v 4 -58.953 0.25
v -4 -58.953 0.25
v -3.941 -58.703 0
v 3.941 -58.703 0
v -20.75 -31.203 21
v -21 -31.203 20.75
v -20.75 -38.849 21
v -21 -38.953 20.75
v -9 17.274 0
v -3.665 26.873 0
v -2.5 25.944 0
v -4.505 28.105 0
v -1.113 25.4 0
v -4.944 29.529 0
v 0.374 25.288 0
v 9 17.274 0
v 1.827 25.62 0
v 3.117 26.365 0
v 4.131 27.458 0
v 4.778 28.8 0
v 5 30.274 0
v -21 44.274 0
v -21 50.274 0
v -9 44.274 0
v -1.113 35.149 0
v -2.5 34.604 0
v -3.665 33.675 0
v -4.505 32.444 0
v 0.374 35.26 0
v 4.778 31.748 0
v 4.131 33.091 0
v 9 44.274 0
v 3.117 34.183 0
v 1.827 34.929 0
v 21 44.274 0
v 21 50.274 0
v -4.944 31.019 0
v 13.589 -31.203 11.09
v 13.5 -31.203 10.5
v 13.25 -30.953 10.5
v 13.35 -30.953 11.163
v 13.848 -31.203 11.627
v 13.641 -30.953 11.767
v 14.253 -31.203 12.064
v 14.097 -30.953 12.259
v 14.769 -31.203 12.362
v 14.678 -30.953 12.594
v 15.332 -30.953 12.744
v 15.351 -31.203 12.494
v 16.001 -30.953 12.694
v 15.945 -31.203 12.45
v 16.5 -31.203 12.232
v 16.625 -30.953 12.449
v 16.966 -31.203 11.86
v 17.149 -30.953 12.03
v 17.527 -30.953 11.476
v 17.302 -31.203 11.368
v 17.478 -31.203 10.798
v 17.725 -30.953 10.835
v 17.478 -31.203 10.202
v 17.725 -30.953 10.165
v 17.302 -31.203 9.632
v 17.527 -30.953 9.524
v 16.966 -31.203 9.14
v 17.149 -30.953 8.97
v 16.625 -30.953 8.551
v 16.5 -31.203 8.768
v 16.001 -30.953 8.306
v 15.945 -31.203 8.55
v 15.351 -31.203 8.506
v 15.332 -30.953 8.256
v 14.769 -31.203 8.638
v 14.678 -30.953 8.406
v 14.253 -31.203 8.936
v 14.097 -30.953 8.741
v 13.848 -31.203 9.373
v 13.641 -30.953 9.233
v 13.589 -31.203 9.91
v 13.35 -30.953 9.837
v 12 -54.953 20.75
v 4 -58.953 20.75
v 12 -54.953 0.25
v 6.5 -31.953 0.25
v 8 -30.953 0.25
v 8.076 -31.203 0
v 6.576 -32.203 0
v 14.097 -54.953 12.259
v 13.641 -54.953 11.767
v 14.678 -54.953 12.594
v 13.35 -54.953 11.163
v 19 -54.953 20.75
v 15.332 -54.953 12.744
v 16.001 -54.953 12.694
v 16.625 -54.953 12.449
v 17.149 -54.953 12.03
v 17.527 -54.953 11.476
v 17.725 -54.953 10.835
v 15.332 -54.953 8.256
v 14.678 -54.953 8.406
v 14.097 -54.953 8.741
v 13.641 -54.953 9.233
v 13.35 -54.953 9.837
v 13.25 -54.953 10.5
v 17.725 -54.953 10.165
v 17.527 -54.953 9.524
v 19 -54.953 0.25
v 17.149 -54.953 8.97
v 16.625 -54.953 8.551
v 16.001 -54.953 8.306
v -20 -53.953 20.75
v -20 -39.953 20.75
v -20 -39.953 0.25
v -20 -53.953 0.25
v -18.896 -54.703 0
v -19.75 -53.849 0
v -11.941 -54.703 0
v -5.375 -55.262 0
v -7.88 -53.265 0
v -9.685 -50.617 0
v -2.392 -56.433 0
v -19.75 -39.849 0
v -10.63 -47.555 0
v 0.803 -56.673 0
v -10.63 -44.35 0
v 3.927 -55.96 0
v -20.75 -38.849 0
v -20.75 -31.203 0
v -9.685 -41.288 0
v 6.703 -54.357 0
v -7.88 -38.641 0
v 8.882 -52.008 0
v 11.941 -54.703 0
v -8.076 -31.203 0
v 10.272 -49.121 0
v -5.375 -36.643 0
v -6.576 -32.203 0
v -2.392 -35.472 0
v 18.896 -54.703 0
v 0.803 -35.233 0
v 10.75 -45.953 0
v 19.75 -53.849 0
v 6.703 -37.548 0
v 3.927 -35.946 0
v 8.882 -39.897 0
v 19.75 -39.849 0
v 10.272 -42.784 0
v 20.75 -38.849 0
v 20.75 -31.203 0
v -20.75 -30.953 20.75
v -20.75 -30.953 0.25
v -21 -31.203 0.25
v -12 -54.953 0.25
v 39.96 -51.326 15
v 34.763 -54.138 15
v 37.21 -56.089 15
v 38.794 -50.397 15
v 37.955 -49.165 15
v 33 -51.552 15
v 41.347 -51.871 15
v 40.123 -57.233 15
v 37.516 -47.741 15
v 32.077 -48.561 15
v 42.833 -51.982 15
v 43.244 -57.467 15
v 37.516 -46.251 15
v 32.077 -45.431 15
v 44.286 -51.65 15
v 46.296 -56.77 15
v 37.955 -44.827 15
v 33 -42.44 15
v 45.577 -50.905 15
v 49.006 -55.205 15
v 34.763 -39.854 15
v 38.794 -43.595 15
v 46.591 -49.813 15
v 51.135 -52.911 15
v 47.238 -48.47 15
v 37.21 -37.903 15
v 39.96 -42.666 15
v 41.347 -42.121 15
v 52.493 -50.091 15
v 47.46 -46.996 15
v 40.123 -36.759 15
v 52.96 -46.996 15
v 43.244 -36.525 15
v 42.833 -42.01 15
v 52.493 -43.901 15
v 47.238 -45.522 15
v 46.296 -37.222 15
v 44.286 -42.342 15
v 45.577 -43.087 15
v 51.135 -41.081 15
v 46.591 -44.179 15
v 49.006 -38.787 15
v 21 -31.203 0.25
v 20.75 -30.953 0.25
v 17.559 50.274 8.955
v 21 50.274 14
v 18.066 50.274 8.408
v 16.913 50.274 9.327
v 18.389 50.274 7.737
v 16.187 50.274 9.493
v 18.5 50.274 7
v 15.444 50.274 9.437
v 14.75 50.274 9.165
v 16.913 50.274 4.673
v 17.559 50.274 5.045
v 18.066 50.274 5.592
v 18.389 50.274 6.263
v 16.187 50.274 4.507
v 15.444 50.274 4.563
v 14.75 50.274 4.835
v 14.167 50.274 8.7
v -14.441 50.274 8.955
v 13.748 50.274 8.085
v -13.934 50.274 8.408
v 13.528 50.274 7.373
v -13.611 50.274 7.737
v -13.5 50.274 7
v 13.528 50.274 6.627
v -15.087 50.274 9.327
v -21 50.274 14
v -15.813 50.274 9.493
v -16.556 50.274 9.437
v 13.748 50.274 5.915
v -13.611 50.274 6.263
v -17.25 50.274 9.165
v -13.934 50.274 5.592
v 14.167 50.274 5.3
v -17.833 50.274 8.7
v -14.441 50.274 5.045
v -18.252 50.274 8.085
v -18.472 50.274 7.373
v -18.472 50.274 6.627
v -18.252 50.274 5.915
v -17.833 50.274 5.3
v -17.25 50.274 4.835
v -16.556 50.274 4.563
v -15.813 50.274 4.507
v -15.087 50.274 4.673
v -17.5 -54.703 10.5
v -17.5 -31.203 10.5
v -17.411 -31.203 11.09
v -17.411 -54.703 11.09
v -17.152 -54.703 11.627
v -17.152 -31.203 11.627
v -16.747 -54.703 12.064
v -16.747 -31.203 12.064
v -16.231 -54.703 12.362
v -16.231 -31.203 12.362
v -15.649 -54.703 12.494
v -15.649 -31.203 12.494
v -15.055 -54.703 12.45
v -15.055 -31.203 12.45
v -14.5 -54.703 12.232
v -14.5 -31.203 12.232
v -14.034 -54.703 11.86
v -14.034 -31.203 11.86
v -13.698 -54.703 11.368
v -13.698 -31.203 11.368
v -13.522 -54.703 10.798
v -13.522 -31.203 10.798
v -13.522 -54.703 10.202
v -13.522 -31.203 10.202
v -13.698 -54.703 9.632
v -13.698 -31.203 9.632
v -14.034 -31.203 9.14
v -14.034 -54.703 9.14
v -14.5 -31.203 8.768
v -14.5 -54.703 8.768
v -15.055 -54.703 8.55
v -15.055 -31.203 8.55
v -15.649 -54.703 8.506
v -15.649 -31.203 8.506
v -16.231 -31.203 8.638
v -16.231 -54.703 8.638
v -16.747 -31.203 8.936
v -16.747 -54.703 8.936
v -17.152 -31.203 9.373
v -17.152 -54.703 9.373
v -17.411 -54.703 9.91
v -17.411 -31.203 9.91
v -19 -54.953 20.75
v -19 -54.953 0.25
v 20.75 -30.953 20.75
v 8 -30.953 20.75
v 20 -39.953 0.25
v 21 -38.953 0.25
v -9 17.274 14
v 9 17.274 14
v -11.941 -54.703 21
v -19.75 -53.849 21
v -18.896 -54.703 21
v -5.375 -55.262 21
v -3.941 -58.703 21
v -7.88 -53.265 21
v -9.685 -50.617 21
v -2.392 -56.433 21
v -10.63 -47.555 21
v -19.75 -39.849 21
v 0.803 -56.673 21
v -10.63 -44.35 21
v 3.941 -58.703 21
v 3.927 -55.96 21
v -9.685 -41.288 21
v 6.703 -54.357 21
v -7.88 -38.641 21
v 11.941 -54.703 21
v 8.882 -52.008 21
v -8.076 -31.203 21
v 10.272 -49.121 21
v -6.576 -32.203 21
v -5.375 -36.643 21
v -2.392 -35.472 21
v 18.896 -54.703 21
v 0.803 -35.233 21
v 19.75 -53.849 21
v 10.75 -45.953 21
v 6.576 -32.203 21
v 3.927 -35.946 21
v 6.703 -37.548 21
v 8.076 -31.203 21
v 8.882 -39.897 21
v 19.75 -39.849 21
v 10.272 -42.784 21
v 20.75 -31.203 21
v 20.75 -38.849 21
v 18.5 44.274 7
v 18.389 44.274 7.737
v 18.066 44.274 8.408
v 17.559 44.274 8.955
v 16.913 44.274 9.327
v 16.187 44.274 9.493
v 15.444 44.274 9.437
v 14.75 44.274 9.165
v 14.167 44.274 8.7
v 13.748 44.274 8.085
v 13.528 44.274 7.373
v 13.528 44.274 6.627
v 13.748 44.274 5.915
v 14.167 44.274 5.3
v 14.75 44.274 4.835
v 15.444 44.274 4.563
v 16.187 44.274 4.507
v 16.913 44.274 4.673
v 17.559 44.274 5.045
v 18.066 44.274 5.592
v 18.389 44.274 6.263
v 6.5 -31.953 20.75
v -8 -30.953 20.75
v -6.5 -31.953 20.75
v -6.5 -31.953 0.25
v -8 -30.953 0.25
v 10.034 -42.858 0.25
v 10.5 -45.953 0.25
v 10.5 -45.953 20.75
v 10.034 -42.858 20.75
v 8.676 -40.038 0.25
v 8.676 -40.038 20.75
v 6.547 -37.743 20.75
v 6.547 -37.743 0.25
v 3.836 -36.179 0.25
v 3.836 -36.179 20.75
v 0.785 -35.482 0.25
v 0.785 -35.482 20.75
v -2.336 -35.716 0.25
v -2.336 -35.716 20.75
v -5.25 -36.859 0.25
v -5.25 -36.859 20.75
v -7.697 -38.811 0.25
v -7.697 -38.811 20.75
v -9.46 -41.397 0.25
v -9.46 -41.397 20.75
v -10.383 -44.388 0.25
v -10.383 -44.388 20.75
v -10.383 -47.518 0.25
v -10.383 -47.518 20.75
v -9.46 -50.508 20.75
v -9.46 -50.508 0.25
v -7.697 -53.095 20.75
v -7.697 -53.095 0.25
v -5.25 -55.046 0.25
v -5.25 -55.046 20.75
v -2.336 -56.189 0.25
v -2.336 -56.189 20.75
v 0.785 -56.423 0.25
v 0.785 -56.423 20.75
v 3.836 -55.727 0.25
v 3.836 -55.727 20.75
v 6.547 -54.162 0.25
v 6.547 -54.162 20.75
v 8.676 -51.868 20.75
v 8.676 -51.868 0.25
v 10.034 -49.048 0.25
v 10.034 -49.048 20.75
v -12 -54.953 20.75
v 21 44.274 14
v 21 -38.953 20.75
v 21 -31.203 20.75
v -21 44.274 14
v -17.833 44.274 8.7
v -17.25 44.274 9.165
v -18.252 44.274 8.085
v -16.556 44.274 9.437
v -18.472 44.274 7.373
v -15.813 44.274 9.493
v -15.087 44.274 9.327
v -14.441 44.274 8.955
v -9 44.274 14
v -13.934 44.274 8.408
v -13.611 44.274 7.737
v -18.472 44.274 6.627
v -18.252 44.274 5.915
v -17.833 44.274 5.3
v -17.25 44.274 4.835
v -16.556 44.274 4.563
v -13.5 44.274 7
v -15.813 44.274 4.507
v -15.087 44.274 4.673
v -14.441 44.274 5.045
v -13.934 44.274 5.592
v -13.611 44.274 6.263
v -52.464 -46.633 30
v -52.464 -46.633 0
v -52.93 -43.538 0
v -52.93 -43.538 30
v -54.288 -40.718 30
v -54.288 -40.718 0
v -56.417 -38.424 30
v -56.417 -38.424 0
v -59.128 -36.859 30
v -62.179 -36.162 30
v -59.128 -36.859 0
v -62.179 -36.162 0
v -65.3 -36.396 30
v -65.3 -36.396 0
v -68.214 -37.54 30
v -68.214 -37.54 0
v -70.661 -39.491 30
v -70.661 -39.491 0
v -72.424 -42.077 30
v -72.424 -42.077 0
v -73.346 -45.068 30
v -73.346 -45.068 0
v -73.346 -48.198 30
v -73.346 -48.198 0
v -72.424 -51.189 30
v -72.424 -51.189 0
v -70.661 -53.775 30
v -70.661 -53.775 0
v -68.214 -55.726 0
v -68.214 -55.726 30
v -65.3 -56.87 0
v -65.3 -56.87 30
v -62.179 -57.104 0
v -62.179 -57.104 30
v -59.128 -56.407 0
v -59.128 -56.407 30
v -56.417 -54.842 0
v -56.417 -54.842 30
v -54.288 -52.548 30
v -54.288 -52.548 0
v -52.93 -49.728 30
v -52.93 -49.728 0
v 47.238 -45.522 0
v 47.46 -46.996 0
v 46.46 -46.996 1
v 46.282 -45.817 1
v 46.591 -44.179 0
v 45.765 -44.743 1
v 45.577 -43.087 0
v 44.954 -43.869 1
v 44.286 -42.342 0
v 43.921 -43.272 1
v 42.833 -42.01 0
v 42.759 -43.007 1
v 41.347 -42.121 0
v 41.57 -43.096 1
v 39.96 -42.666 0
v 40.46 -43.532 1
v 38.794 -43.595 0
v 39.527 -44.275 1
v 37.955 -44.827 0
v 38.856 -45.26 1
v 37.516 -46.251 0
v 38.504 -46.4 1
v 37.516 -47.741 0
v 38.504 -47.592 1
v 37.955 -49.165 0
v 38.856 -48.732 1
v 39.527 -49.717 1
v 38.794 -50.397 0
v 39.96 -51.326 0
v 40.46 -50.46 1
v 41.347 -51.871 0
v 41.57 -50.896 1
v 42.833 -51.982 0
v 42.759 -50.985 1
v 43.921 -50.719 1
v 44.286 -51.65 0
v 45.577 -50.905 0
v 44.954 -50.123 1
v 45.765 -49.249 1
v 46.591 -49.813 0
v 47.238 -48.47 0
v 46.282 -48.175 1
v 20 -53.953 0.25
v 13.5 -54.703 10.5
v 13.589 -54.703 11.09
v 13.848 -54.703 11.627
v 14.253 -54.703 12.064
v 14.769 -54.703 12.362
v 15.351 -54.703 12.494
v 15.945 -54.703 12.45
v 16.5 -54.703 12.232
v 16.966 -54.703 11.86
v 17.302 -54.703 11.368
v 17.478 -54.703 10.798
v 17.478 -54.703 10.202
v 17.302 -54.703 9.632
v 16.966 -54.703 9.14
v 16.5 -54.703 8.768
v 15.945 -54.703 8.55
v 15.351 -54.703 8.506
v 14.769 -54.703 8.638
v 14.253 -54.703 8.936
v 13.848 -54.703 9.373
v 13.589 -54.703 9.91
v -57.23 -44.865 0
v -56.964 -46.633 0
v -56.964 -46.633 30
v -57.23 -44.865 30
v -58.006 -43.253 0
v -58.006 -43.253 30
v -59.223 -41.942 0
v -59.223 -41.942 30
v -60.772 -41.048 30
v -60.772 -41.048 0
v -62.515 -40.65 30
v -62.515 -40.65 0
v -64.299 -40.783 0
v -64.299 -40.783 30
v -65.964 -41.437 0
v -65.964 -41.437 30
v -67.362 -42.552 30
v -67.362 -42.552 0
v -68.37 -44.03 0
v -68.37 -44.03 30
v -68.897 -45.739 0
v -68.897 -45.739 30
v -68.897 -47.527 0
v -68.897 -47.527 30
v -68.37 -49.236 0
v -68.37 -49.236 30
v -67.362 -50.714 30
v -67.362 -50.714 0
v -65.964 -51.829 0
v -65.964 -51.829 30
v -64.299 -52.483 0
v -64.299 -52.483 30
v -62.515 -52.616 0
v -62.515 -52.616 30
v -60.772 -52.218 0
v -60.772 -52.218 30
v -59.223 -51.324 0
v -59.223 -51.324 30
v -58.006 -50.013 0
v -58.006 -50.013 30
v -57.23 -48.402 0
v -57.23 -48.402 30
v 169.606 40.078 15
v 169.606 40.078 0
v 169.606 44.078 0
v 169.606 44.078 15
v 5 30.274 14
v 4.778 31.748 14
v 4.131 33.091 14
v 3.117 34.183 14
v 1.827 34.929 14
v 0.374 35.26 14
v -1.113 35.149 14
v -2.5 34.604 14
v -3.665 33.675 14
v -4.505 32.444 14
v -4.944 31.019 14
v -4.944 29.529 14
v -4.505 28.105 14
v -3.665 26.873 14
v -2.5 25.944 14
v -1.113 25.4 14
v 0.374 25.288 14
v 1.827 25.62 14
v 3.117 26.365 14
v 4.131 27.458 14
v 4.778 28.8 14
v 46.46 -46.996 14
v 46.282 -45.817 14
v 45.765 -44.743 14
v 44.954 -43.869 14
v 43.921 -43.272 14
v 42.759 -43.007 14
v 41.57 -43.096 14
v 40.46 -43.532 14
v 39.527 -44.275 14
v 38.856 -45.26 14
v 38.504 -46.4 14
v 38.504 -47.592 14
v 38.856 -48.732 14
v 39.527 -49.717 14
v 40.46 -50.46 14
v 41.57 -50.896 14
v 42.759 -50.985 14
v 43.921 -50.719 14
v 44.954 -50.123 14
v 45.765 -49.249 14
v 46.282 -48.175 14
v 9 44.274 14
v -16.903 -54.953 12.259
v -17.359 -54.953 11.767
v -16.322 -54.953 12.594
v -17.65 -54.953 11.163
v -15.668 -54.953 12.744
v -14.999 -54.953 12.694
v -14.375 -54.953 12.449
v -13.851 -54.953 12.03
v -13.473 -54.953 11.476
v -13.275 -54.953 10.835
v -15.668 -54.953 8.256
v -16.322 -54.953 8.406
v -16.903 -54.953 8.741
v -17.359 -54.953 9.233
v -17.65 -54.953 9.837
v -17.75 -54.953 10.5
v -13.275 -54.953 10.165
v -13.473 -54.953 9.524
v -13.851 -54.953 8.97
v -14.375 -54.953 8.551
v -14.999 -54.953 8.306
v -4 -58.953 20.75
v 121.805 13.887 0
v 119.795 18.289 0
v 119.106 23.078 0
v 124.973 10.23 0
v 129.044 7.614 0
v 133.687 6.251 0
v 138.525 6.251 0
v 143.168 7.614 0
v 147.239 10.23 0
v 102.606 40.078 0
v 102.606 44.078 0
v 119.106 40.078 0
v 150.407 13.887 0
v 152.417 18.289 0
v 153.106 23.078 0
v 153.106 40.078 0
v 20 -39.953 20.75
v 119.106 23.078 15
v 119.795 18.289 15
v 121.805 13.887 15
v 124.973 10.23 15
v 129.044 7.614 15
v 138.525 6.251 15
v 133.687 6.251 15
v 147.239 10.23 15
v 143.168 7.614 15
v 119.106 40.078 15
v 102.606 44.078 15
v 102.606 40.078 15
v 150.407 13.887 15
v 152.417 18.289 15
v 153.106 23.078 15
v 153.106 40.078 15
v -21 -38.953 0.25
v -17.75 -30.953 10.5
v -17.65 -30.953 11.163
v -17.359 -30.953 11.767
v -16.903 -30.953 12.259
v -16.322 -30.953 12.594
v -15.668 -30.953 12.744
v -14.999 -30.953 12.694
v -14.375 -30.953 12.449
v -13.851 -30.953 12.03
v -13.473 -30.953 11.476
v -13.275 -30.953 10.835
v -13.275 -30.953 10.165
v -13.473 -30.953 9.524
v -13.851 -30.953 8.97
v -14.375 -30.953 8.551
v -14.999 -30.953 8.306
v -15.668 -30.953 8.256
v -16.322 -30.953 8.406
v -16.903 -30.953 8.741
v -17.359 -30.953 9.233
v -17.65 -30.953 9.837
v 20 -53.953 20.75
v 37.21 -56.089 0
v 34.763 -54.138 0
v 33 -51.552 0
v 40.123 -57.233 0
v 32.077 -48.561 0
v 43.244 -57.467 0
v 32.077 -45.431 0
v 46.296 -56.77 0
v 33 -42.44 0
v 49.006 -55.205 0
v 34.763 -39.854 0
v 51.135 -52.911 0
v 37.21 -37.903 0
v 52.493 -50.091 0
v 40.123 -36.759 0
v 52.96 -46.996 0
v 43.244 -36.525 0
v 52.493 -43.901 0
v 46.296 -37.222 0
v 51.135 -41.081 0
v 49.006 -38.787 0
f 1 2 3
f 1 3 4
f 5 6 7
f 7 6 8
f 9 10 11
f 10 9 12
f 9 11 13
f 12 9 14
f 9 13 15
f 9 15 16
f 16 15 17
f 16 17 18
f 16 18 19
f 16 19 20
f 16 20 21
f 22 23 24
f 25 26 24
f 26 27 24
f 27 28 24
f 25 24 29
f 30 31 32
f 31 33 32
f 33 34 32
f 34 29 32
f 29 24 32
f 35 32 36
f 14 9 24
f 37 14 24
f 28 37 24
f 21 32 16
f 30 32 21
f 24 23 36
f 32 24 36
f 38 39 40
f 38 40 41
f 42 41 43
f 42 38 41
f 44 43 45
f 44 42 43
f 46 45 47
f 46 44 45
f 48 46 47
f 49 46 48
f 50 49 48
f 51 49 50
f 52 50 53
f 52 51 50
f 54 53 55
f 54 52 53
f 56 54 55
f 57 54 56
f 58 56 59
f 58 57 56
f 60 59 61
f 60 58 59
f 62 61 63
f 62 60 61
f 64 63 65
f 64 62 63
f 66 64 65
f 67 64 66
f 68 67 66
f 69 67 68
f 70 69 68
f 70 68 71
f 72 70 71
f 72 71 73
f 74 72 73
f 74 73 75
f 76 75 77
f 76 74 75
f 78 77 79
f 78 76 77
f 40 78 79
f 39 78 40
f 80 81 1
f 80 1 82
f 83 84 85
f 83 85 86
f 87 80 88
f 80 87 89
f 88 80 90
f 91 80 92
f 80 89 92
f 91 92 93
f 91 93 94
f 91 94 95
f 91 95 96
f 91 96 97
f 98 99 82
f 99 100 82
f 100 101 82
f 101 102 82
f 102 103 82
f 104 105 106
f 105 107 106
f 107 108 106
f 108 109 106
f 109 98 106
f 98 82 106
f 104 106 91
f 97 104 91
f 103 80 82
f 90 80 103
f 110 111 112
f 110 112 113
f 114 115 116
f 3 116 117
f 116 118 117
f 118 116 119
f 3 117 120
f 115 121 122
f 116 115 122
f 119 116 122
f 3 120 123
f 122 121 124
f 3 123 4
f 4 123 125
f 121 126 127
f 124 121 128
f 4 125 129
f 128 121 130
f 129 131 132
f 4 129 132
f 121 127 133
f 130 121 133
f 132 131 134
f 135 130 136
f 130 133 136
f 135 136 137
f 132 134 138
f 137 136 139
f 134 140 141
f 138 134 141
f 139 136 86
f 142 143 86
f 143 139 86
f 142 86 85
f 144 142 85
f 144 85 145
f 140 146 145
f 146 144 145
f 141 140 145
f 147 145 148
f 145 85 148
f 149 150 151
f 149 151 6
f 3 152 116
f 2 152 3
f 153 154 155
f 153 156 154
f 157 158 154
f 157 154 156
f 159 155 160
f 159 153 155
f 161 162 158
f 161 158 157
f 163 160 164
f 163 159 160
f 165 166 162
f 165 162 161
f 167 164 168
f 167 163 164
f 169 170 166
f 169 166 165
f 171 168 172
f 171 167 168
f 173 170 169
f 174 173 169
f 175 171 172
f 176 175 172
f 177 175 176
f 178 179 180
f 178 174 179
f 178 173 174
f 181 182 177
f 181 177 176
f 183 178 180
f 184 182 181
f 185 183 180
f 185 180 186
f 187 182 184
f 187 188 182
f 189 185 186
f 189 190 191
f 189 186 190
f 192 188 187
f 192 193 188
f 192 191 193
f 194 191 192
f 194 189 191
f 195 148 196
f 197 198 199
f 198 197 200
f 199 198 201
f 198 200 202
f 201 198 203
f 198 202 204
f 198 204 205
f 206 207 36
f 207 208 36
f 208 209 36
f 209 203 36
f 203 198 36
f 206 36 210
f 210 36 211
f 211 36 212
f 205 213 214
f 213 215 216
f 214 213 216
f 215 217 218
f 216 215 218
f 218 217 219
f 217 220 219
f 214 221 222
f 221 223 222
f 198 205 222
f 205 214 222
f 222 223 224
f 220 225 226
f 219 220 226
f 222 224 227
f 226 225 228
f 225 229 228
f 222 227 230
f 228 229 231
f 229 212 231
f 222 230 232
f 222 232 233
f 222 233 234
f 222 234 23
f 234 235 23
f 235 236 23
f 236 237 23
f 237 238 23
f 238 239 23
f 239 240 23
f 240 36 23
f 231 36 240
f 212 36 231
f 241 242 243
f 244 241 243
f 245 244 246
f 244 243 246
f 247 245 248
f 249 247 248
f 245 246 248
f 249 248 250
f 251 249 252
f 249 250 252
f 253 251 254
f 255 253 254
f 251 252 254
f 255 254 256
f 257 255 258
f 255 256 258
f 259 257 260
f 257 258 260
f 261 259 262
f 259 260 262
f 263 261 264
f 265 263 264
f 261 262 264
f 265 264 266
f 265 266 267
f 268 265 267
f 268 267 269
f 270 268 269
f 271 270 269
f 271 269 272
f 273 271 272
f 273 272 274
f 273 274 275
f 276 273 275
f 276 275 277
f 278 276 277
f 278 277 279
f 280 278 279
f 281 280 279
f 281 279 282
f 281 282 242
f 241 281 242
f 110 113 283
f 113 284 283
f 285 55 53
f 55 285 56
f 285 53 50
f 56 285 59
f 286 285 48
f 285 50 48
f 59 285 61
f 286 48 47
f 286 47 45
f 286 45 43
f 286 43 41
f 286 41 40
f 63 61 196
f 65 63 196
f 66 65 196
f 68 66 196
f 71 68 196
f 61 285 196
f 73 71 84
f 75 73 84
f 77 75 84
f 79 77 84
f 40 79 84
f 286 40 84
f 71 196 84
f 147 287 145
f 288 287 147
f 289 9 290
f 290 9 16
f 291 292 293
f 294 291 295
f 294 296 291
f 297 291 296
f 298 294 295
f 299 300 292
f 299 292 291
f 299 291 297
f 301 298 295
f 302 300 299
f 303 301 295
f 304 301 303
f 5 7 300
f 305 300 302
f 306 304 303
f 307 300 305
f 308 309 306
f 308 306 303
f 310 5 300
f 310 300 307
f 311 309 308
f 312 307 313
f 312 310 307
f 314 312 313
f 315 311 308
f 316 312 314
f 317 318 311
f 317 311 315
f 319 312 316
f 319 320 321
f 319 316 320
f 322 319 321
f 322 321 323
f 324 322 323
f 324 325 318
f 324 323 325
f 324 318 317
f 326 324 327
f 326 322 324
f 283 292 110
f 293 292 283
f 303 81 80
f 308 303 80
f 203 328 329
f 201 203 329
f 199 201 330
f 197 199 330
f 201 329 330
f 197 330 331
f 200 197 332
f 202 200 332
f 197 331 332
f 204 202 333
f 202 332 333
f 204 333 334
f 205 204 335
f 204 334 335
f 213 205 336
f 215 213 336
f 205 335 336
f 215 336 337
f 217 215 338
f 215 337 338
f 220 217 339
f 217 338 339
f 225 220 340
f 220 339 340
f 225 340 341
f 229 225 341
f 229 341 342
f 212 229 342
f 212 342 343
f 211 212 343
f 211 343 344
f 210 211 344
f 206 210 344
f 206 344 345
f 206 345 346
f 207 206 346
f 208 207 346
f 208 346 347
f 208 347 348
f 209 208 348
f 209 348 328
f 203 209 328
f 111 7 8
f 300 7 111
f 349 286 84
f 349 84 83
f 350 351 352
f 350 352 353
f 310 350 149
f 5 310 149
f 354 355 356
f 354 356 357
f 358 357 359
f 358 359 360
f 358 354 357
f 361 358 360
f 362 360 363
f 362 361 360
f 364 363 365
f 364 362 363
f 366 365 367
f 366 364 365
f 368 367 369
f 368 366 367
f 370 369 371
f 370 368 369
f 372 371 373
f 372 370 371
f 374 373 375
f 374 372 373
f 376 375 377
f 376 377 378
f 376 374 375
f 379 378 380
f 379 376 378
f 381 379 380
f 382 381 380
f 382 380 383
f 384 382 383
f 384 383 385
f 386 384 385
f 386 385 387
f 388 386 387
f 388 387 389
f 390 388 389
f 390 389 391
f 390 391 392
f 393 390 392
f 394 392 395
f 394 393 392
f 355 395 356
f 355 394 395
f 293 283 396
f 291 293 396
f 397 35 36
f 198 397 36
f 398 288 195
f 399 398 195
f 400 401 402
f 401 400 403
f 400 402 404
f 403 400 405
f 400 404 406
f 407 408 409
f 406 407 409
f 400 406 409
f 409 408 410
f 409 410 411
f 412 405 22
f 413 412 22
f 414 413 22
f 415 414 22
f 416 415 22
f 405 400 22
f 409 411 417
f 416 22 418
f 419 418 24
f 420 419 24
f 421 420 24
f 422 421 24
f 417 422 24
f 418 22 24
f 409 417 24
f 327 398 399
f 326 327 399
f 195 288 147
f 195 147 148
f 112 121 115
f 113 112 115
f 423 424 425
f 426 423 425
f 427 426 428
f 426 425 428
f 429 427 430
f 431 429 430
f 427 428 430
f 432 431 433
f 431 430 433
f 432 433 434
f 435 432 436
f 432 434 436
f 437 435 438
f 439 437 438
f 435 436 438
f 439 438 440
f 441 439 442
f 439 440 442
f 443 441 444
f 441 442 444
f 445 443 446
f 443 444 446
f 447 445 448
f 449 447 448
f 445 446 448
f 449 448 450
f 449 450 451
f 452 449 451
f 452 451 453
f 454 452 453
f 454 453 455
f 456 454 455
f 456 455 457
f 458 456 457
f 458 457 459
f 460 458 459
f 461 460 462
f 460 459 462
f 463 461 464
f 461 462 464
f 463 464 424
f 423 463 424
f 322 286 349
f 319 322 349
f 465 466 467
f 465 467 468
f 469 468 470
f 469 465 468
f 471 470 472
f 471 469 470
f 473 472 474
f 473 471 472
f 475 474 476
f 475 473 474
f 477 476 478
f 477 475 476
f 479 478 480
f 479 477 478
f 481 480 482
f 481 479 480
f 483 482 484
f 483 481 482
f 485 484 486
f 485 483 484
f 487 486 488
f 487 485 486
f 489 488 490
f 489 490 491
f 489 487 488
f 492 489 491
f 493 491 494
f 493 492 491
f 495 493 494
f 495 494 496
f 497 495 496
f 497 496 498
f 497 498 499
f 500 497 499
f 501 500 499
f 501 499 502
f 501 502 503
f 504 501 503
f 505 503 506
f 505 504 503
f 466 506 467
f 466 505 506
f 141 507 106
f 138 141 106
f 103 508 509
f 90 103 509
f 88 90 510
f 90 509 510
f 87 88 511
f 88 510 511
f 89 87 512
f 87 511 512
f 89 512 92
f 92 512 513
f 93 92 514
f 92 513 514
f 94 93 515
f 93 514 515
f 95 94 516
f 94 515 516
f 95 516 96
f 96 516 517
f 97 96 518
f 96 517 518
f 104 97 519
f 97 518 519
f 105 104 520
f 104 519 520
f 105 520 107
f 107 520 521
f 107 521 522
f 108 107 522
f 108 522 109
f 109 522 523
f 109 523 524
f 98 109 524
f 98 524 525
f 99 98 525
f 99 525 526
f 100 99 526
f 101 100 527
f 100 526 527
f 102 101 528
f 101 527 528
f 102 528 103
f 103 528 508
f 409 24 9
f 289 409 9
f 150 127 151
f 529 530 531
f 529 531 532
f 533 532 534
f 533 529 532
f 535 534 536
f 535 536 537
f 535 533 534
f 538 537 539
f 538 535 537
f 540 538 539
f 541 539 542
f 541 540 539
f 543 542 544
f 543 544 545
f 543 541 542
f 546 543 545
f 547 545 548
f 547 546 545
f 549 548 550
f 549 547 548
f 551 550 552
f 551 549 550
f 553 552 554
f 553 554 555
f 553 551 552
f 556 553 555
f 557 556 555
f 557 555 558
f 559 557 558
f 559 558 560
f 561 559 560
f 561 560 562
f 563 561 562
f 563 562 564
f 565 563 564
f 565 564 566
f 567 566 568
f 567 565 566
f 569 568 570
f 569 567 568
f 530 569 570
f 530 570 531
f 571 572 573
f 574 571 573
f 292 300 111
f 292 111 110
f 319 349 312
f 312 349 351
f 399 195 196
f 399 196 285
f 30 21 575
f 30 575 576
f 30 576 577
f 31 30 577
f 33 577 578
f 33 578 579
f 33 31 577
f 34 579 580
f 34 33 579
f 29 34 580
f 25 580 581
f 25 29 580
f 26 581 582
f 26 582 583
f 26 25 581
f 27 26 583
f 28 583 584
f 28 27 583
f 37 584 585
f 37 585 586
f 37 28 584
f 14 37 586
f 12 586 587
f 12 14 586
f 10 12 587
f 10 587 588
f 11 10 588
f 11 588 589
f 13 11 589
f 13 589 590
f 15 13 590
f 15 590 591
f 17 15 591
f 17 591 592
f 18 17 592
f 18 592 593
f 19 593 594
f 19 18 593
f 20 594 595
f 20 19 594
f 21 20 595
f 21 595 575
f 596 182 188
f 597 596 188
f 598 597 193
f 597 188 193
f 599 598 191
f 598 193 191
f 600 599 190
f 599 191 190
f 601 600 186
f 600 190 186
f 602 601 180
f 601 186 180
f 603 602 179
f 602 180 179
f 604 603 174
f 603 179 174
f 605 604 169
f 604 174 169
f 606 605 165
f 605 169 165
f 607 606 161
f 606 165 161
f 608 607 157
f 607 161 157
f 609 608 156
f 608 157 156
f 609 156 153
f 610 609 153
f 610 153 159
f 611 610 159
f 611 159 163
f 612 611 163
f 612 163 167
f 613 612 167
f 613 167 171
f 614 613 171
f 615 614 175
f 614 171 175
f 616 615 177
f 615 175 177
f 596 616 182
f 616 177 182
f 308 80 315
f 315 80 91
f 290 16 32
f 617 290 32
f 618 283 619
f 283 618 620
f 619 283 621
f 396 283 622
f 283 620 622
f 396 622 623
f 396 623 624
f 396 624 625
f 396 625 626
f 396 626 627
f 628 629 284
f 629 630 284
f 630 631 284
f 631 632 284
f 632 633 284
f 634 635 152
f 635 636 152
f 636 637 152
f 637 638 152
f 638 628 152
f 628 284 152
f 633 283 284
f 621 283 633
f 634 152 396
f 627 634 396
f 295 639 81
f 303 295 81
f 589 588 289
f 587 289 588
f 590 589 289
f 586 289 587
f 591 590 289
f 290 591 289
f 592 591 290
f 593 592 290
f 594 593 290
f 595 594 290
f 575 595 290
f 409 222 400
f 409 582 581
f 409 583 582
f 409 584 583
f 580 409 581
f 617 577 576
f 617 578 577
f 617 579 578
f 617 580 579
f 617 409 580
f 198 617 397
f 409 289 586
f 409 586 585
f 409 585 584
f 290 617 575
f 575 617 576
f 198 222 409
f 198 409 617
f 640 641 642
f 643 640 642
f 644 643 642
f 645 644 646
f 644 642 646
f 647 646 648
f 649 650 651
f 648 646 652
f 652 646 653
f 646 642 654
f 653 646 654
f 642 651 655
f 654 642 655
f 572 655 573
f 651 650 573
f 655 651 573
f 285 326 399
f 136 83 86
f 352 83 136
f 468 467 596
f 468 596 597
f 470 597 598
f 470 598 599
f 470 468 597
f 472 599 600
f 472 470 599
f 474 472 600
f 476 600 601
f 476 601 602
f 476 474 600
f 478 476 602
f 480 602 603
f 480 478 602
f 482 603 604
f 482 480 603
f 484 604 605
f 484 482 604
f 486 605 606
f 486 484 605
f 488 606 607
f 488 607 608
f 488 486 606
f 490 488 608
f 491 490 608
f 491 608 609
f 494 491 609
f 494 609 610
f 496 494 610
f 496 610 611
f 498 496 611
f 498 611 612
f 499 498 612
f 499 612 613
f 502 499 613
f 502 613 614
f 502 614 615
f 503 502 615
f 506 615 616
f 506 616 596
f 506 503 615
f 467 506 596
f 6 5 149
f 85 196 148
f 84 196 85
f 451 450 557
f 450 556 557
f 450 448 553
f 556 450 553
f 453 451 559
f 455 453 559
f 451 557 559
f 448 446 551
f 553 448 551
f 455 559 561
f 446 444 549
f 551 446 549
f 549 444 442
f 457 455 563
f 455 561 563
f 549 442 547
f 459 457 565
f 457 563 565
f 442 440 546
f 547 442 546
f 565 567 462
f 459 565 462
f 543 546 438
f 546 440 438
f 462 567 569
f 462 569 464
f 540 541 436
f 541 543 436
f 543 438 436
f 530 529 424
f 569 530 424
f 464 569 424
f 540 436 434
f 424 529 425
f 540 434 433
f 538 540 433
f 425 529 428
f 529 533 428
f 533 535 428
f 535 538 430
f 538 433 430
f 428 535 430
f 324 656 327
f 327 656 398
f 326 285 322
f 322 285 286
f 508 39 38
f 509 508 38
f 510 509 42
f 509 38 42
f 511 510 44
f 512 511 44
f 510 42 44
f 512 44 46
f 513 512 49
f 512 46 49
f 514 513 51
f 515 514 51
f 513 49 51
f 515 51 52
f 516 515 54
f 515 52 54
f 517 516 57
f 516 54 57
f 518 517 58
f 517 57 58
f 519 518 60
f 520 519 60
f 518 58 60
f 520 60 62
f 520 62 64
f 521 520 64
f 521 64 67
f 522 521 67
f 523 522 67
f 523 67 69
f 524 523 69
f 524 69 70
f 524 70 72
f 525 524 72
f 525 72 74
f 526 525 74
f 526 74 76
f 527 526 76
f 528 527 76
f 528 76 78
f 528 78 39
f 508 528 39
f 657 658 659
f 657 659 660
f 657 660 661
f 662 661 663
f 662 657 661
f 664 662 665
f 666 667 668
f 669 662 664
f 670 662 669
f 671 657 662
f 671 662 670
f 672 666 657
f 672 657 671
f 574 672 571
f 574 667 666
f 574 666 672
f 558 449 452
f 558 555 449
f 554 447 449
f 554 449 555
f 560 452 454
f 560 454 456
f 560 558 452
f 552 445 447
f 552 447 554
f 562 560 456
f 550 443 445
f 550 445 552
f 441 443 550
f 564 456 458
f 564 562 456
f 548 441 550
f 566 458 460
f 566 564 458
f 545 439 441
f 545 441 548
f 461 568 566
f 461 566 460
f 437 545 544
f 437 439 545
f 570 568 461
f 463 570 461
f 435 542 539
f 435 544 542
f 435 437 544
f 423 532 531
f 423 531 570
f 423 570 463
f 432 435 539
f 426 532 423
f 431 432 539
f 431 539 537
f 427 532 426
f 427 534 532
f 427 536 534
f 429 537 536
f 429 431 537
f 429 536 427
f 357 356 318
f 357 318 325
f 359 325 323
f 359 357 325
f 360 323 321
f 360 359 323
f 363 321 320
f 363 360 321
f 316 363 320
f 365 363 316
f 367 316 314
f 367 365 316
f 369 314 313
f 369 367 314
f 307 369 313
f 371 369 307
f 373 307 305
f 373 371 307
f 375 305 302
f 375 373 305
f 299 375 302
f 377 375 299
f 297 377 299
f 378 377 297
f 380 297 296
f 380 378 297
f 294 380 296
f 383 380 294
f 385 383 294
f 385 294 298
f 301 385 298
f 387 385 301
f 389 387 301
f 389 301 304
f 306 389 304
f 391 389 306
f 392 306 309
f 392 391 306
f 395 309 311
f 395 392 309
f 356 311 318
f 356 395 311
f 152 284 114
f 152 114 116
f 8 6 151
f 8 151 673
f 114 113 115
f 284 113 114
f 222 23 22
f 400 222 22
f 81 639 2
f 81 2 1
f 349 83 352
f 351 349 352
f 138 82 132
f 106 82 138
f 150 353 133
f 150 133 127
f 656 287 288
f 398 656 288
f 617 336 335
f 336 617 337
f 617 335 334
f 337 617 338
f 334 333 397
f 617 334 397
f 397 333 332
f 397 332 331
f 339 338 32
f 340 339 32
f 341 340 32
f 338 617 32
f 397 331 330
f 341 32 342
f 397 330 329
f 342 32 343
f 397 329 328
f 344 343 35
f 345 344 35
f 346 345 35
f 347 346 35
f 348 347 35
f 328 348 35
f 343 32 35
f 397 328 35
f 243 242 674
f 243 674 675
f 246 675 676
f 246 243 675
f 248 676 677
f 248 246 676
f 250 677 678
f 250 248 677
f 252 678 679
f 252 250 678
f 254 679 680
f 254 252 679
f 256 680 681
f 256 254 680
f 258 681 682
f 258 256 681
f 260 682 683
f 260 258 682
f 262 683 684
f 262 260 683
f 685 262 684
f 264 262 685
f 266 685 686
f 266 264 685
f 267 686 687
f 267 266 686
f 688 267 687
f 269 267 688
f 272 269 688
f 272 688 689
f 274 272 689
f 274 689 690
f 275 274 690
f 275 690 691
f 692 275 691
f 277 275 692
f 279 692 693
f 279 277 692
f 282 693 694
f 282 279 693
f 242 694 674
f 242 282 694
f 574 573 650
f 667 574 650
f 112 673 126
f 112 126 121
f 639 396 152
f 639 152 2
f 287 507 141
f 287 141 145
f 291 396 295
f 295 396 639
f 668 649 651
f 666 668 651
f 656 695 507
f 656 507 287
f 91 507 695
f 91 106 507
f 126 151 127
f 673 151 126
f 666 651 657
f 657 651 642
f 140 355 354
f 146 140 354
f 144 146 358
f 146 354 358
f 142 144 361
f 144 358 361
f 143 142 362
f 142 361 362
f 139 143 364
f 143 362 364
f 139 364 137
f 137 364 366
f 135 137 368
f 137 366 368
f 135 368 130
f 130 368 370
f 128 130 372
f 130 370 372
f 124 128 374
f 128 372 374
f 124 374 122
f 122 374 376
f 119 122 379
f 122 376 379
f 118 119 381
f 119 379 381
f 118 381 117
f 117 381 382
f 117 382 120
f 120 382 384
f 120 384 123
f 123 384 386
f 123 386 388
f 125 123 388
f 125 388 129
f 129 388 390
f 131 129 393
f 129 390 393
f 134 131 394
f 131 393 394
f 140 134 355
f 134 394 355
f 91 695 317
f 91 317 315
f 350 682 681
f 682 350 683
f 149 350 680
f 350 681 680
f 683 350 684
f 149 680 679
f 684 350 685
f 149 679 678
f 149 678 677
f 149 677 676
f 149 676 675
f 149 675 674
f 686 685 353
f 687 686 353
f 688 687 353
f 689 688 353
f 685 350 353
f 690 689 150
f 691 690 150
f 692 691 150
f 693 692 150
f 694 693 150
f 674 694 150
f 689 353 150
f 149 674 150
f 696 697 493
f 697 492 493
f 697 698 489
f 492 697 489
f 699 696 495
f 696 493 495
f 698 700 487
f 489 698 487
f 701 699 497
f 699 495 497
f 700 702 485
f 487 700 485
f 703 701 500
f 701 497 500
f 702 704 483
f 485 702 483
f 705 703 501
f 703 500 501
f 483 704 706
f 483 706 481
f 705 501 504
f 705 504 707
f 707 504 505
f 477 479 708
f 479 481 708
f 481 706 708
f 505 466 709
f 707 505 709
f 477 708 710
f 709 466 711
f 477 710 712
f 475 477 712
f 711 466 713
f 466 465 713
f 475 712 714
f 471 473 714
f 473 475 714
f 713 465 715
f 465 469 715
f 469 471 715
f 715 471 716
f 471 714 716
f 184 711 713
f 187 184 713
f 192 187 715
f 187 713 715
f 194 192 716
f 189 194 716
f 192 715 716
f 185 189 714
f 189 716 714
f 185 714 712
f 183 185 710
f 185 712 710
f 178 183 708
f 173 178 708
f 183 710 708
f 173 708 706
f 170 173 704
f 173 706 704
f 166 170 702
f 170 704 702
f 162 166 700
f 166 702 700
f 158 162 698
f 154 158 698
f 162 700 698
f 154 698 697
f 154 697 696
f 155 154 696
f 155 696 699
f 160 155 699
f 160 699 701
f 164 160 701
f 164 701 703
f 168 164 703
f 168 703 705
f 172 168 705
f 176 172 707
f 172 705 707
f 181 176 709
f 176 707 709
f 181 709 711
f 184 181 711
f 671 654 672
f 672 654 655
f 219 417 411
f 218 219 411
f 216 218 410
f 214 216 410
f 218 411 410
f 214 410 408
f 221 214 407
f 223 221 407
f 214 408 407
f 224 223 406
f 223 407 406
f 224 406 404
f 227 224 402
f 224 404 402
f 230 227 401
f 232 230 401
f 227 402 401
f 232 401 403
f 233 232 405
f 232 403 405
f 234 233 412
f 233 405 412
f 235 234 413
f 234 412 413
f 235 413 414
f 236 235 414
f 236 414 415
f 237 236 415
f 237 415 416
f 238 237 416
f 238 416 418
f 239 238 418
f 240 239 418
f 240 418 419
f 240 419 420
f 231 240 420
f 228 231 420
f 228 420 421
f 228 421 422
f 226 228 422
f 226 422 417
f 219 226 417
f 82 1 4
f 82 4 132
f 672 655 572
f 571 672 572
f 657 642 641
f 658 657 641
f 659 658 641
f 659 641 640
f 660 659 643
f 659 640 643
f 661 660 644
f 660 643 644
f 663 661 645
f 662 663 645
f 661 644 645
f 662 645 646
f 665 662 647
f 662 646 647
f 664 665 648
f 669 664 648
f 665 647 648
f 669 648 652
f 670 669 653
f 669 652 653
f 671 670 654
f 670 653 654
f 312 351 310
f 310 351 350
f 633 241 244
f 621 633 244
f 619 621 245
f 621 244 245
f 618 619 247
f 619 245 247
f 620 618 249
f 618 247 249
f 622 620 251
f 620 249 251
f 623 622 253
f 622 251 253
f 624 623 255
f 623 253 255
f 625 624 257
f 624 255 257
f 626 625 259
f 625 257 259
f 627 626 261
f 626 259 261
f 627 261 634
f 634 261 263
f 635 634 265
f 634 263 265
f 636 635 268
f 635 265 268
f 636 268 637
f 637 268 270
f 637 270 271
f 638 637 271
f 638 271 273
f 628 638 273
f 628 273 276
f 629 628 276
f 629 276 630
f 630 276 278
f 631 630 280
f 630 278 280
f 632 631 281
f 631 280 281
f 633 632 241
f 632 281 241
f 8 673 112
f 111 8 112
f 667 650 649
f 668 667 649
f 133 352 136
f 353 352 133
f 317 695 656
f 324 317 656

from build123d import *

# Parameters (mm, degrees)
F0_R      = 5
F1_DEPTH  = 14
F2_R      = 2.5
F3_DEPTH  = 6.001
F4_R      = 10.5
F5_DEPTH  = 21
F6_SIZE   = 1
F7_R      = 2
F8_DEPTH  = 28.001
F9_SIZE   = 0.25
F10_R     = 10.5
F10_R_2   = 4
F11_DEPTH = 15
F12_SIZE  = 1
F13_R     = 10.5
F13_R_2   = 6
F14_DEPTH = 30
F16_DEPTH = 15


with BuildPart() as f1:
    # F0 (on Top) → F1 (new body)
    with BuildSketch(Plane.XY):
        Polygon((0, 50.274196), (-21, 50.274196), (-21, 44.274196), (-9, 44.274196), (-9, 17.274196), (9, 17.274196), (9, 44.274196), (21, 44.274196), (21, 50.274196), align=None)
        with Locations((0, 30.274196)):
            Circle(F0_R, mode=Mode.SUBTRACT)
    extrude(amount=F1_DEPTH)

    # F2 (on face) → F3 (cut, through all)
    with BuildSketch(Plane.XZ.offset(-44.274196)):
        with Locations((-16, 7)):
            Circle(F2_R)
        with Locations((16, 7)):
            Circle(F2_R)
    extrude(amount=-F3_DEPTH, mode=Mode.SUBTRACT)


with BuildPart() as f5:
    # F4 (on Top) → F5 (new body)
    with BuildSketch(Plane.XY):
        Polygon((-8, -30.952703), (-21, -30.952703), (-21, -38.952703), (-20, -39.952703), (-20, -54.952703), (-12, -54.952703), (-4, -58.952703), (0, -58.952703), (4, -58.952703), (12, -54.952703), (20, -54.952703), (20, -39.952703), (21, -38.952703), (21, -30.952703), (8, -30.952703), (6.5, -31.952703), (-6.5, -31.952703), align=None)
        with Locations((0, -45.952703)):
            Circle(F4_R, mode=Mode.SUBTRACT)
    extrude(amount=F5_DEPTH)

    # F6
    f6_edges = [f5.edges().sort_by_distance(p)[0] for p in [
        (-20, -54.952703, 10.5),
        (20, -54.952703, 10.5),
    ]]
    chamfer(f6_edges, length=F6_SIZE)

    # F7 (on face) → F8 (cut, through all)
    with BuildSketch(Plane(origin=(0, -30.952703, 0), x_dir=(-1, 0, 0), z_dir=(0, 1, 0))):
        with Locations((15.5, 10.5)):
            Circle(F7_R)
        with Locations((-15.5, 10.5)):
            Circle(F7_R)
    extrude(amount=-F8_DEPTH, mode=Mode.SUBTRACT)

    # F9
    f9_edges = [f5.edges().sort_by_distance(p)[0] for p in [
        (-20, -46.952703, 21),
        (-19.5, -54.452703, 21),
        (-20.5, -39.452703, 21),
        (-15.5, -54.952703, 21),
        (-21, -34.952703, 21),
        (-8, -56.952703, 21),
        (-14.5, -30.952703, 21),
        (0, -58.952703, 21),
        (-7.25, -31.452703, 21),
        (8, -56.952703, 21),
        (0, -31.952703, 21),
        (15.5, -54.952703, 21),
        (7.25, -31.452703, 21),
        (19.5, -54.452703, 21),
        (14.5, -30.952703, 21),
        (20, -46.952703, 21),
        (21, -34.952703, 21),
        (20.5, -39.452703, 21),
        (-10.5, -45.952703, 21),
        (-20, -46.952703, 0),
        (-19.5, -54.452703, 0),
        (-20.5, -39.452703, 0),
        (-15.5, -54.952703, 0),
        (-21, -34.952703, 0),
        (-8, -56.952703, 0),
        (-14.5, -30.952703, 0),
        (0, -58.952703, 0),
        (-7.25, -31.452703, 0),
        (8, -56.952703, 0),
        (0, -31.952703, 0),
        (15.5, -54.952703, 0),
        (7.25, -31.452703, 0),
        (19.5, -54.452703, 0),
        (14.5, -30.952703, 0),
        (20, -46.952703, 0),
        (21, -34.952703, 0),
        (20.5, -39.452703, 0),
        (-10.5, -45.952703, 0),
        (21, -30.952703, 10.5),
        (-21, -30.952703, 10.5),
        (-13.5, -54.952703, 10.5),
        (17.5, -54.952703, 10.5),
        (17.5, -30.952703, 10.5),
        (-13.5, -30.952703, 10.5),
    ]]
    chamfer(f9_edges, length=F9_SIZE)


with BuildPart() as f11:
    # F10 (on Top) → F11 (new body)
    with BuildSketch(Plane.XY):
        with Locations((42.459678, -46.995971)):
            Circle(F10_R)
        with Locations((42.459678, -46.995971)):
            Circle(F10_R_2, mode=Mode.SUBTRACT)
    extrude(amount=F11_DEPTH)

    # F12
    f12_edges = [f11.edges().sort_by_distance(p)[0] for p in [
        (38.459678, -46.995971, 15),
        (38.459678, -46.995971, 0),
    ]]
    chamfer(f12_edges, length=F12_SIZE)


with BuildPart() as f14:
    # F13 (on Top) → F14 (new body)
    with BuildSketch(Plane.XY):
        with Locations((-62.963709, -46.633065)):
            Circle(F13_R)
        with Locations((-62.963709, -46.633065)):
            Circle(F13_R_2, mode=Mode.SUBTRACT)
    extrude(amount=F14_DEPTH)


with BuildPart() as f16:
    # F15 (on Top) → F16 (new body)
    with BuildSketch(Plane.XY):
        with BuildLine():
            ThreePointArc((119.106029, 23.078203), (136.106029, 6.078203), (153.106029, 23.078203))
            ThreePointArc((153.106029, 23.078203), (148.126844, 35.099018), (136.106029, 40.078203))
            ThreePointArc((136.106029, 40.078203), (124.085214, 35.099018), (119.106029, 23.078203))
        make_face()
        with BuildLine():
            ThreePointArc((136.106029, 40.078203), (148.126844, 35.099018), (153.106029, 23.078203))
            Line((153.106029, 23.078203), (153.106029, 40.078203))
            Line((153.106029, 40.078203), (136.106029, 40.078203))
        make_face()
        Polygon((119.106029, 40.078203), (136.106029, 40.078203), (153.106029, 40.078203), (169.606029, 40.078203), (169.606029, 44.078203), (102.606029, 44.078203), (102.606029, 40.078203), align=None)
        with BuildLine():
            ThreePointArc((119.106029, 23.078203), (124.085214, 35.099018), (136.106029, 40.078203))
            Line((136.106029, 40.078203), (119.106029, 40.078203))
            Line((119.106029, 40.078203), (119.106029, 23.078203))
        make_face()
    extrude(amount=F16_DEPTH)


solid = Compound([f1.part, f5.part, f11.part, f14.part, f16.part])
